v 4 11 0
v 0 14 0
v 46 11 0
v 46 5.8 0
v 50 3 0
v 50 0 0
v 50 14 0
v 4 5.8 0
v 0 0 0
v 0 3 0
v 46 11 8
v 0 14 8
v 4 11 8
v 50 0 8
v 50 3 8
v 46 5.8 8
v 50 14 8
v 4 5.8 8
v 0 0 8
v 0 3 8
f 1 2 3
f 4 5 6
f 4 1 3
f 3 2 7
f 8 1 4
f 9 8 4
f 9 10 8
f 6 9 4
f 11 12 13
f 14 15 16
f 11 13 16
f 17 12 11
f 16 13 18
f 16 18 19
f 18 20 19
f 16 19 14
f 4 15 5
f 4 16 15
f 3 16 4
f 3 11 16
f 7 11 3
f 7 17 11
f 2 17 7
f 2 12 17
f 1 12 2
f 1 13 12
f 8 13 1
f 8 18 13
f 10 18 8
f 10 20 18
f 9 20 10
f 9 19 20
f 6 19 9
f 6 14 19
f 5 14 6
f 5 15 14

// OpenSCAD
$fn = 32;

// ----------------------------------------------------------------------
// Key bar: dovetail key, 8 mm thick
// ----------------------------------------------------------------------

// --- parameters (mm) ---
profile_height = 8;       // extrusion height
profile_points = 10;      // points of the closed outline

profile = [[0, 0], [50, 0], [50, 3], [46, 5.8], [46, 11], [50, 14], [0, 14], [4, 11], [4, 5.8], [0, 3]];  // single closed polygon, 10 points, counter clockwise

// --- the one profile operation ---
linear_extrude(height = profile_height) polygon(points = profile);
